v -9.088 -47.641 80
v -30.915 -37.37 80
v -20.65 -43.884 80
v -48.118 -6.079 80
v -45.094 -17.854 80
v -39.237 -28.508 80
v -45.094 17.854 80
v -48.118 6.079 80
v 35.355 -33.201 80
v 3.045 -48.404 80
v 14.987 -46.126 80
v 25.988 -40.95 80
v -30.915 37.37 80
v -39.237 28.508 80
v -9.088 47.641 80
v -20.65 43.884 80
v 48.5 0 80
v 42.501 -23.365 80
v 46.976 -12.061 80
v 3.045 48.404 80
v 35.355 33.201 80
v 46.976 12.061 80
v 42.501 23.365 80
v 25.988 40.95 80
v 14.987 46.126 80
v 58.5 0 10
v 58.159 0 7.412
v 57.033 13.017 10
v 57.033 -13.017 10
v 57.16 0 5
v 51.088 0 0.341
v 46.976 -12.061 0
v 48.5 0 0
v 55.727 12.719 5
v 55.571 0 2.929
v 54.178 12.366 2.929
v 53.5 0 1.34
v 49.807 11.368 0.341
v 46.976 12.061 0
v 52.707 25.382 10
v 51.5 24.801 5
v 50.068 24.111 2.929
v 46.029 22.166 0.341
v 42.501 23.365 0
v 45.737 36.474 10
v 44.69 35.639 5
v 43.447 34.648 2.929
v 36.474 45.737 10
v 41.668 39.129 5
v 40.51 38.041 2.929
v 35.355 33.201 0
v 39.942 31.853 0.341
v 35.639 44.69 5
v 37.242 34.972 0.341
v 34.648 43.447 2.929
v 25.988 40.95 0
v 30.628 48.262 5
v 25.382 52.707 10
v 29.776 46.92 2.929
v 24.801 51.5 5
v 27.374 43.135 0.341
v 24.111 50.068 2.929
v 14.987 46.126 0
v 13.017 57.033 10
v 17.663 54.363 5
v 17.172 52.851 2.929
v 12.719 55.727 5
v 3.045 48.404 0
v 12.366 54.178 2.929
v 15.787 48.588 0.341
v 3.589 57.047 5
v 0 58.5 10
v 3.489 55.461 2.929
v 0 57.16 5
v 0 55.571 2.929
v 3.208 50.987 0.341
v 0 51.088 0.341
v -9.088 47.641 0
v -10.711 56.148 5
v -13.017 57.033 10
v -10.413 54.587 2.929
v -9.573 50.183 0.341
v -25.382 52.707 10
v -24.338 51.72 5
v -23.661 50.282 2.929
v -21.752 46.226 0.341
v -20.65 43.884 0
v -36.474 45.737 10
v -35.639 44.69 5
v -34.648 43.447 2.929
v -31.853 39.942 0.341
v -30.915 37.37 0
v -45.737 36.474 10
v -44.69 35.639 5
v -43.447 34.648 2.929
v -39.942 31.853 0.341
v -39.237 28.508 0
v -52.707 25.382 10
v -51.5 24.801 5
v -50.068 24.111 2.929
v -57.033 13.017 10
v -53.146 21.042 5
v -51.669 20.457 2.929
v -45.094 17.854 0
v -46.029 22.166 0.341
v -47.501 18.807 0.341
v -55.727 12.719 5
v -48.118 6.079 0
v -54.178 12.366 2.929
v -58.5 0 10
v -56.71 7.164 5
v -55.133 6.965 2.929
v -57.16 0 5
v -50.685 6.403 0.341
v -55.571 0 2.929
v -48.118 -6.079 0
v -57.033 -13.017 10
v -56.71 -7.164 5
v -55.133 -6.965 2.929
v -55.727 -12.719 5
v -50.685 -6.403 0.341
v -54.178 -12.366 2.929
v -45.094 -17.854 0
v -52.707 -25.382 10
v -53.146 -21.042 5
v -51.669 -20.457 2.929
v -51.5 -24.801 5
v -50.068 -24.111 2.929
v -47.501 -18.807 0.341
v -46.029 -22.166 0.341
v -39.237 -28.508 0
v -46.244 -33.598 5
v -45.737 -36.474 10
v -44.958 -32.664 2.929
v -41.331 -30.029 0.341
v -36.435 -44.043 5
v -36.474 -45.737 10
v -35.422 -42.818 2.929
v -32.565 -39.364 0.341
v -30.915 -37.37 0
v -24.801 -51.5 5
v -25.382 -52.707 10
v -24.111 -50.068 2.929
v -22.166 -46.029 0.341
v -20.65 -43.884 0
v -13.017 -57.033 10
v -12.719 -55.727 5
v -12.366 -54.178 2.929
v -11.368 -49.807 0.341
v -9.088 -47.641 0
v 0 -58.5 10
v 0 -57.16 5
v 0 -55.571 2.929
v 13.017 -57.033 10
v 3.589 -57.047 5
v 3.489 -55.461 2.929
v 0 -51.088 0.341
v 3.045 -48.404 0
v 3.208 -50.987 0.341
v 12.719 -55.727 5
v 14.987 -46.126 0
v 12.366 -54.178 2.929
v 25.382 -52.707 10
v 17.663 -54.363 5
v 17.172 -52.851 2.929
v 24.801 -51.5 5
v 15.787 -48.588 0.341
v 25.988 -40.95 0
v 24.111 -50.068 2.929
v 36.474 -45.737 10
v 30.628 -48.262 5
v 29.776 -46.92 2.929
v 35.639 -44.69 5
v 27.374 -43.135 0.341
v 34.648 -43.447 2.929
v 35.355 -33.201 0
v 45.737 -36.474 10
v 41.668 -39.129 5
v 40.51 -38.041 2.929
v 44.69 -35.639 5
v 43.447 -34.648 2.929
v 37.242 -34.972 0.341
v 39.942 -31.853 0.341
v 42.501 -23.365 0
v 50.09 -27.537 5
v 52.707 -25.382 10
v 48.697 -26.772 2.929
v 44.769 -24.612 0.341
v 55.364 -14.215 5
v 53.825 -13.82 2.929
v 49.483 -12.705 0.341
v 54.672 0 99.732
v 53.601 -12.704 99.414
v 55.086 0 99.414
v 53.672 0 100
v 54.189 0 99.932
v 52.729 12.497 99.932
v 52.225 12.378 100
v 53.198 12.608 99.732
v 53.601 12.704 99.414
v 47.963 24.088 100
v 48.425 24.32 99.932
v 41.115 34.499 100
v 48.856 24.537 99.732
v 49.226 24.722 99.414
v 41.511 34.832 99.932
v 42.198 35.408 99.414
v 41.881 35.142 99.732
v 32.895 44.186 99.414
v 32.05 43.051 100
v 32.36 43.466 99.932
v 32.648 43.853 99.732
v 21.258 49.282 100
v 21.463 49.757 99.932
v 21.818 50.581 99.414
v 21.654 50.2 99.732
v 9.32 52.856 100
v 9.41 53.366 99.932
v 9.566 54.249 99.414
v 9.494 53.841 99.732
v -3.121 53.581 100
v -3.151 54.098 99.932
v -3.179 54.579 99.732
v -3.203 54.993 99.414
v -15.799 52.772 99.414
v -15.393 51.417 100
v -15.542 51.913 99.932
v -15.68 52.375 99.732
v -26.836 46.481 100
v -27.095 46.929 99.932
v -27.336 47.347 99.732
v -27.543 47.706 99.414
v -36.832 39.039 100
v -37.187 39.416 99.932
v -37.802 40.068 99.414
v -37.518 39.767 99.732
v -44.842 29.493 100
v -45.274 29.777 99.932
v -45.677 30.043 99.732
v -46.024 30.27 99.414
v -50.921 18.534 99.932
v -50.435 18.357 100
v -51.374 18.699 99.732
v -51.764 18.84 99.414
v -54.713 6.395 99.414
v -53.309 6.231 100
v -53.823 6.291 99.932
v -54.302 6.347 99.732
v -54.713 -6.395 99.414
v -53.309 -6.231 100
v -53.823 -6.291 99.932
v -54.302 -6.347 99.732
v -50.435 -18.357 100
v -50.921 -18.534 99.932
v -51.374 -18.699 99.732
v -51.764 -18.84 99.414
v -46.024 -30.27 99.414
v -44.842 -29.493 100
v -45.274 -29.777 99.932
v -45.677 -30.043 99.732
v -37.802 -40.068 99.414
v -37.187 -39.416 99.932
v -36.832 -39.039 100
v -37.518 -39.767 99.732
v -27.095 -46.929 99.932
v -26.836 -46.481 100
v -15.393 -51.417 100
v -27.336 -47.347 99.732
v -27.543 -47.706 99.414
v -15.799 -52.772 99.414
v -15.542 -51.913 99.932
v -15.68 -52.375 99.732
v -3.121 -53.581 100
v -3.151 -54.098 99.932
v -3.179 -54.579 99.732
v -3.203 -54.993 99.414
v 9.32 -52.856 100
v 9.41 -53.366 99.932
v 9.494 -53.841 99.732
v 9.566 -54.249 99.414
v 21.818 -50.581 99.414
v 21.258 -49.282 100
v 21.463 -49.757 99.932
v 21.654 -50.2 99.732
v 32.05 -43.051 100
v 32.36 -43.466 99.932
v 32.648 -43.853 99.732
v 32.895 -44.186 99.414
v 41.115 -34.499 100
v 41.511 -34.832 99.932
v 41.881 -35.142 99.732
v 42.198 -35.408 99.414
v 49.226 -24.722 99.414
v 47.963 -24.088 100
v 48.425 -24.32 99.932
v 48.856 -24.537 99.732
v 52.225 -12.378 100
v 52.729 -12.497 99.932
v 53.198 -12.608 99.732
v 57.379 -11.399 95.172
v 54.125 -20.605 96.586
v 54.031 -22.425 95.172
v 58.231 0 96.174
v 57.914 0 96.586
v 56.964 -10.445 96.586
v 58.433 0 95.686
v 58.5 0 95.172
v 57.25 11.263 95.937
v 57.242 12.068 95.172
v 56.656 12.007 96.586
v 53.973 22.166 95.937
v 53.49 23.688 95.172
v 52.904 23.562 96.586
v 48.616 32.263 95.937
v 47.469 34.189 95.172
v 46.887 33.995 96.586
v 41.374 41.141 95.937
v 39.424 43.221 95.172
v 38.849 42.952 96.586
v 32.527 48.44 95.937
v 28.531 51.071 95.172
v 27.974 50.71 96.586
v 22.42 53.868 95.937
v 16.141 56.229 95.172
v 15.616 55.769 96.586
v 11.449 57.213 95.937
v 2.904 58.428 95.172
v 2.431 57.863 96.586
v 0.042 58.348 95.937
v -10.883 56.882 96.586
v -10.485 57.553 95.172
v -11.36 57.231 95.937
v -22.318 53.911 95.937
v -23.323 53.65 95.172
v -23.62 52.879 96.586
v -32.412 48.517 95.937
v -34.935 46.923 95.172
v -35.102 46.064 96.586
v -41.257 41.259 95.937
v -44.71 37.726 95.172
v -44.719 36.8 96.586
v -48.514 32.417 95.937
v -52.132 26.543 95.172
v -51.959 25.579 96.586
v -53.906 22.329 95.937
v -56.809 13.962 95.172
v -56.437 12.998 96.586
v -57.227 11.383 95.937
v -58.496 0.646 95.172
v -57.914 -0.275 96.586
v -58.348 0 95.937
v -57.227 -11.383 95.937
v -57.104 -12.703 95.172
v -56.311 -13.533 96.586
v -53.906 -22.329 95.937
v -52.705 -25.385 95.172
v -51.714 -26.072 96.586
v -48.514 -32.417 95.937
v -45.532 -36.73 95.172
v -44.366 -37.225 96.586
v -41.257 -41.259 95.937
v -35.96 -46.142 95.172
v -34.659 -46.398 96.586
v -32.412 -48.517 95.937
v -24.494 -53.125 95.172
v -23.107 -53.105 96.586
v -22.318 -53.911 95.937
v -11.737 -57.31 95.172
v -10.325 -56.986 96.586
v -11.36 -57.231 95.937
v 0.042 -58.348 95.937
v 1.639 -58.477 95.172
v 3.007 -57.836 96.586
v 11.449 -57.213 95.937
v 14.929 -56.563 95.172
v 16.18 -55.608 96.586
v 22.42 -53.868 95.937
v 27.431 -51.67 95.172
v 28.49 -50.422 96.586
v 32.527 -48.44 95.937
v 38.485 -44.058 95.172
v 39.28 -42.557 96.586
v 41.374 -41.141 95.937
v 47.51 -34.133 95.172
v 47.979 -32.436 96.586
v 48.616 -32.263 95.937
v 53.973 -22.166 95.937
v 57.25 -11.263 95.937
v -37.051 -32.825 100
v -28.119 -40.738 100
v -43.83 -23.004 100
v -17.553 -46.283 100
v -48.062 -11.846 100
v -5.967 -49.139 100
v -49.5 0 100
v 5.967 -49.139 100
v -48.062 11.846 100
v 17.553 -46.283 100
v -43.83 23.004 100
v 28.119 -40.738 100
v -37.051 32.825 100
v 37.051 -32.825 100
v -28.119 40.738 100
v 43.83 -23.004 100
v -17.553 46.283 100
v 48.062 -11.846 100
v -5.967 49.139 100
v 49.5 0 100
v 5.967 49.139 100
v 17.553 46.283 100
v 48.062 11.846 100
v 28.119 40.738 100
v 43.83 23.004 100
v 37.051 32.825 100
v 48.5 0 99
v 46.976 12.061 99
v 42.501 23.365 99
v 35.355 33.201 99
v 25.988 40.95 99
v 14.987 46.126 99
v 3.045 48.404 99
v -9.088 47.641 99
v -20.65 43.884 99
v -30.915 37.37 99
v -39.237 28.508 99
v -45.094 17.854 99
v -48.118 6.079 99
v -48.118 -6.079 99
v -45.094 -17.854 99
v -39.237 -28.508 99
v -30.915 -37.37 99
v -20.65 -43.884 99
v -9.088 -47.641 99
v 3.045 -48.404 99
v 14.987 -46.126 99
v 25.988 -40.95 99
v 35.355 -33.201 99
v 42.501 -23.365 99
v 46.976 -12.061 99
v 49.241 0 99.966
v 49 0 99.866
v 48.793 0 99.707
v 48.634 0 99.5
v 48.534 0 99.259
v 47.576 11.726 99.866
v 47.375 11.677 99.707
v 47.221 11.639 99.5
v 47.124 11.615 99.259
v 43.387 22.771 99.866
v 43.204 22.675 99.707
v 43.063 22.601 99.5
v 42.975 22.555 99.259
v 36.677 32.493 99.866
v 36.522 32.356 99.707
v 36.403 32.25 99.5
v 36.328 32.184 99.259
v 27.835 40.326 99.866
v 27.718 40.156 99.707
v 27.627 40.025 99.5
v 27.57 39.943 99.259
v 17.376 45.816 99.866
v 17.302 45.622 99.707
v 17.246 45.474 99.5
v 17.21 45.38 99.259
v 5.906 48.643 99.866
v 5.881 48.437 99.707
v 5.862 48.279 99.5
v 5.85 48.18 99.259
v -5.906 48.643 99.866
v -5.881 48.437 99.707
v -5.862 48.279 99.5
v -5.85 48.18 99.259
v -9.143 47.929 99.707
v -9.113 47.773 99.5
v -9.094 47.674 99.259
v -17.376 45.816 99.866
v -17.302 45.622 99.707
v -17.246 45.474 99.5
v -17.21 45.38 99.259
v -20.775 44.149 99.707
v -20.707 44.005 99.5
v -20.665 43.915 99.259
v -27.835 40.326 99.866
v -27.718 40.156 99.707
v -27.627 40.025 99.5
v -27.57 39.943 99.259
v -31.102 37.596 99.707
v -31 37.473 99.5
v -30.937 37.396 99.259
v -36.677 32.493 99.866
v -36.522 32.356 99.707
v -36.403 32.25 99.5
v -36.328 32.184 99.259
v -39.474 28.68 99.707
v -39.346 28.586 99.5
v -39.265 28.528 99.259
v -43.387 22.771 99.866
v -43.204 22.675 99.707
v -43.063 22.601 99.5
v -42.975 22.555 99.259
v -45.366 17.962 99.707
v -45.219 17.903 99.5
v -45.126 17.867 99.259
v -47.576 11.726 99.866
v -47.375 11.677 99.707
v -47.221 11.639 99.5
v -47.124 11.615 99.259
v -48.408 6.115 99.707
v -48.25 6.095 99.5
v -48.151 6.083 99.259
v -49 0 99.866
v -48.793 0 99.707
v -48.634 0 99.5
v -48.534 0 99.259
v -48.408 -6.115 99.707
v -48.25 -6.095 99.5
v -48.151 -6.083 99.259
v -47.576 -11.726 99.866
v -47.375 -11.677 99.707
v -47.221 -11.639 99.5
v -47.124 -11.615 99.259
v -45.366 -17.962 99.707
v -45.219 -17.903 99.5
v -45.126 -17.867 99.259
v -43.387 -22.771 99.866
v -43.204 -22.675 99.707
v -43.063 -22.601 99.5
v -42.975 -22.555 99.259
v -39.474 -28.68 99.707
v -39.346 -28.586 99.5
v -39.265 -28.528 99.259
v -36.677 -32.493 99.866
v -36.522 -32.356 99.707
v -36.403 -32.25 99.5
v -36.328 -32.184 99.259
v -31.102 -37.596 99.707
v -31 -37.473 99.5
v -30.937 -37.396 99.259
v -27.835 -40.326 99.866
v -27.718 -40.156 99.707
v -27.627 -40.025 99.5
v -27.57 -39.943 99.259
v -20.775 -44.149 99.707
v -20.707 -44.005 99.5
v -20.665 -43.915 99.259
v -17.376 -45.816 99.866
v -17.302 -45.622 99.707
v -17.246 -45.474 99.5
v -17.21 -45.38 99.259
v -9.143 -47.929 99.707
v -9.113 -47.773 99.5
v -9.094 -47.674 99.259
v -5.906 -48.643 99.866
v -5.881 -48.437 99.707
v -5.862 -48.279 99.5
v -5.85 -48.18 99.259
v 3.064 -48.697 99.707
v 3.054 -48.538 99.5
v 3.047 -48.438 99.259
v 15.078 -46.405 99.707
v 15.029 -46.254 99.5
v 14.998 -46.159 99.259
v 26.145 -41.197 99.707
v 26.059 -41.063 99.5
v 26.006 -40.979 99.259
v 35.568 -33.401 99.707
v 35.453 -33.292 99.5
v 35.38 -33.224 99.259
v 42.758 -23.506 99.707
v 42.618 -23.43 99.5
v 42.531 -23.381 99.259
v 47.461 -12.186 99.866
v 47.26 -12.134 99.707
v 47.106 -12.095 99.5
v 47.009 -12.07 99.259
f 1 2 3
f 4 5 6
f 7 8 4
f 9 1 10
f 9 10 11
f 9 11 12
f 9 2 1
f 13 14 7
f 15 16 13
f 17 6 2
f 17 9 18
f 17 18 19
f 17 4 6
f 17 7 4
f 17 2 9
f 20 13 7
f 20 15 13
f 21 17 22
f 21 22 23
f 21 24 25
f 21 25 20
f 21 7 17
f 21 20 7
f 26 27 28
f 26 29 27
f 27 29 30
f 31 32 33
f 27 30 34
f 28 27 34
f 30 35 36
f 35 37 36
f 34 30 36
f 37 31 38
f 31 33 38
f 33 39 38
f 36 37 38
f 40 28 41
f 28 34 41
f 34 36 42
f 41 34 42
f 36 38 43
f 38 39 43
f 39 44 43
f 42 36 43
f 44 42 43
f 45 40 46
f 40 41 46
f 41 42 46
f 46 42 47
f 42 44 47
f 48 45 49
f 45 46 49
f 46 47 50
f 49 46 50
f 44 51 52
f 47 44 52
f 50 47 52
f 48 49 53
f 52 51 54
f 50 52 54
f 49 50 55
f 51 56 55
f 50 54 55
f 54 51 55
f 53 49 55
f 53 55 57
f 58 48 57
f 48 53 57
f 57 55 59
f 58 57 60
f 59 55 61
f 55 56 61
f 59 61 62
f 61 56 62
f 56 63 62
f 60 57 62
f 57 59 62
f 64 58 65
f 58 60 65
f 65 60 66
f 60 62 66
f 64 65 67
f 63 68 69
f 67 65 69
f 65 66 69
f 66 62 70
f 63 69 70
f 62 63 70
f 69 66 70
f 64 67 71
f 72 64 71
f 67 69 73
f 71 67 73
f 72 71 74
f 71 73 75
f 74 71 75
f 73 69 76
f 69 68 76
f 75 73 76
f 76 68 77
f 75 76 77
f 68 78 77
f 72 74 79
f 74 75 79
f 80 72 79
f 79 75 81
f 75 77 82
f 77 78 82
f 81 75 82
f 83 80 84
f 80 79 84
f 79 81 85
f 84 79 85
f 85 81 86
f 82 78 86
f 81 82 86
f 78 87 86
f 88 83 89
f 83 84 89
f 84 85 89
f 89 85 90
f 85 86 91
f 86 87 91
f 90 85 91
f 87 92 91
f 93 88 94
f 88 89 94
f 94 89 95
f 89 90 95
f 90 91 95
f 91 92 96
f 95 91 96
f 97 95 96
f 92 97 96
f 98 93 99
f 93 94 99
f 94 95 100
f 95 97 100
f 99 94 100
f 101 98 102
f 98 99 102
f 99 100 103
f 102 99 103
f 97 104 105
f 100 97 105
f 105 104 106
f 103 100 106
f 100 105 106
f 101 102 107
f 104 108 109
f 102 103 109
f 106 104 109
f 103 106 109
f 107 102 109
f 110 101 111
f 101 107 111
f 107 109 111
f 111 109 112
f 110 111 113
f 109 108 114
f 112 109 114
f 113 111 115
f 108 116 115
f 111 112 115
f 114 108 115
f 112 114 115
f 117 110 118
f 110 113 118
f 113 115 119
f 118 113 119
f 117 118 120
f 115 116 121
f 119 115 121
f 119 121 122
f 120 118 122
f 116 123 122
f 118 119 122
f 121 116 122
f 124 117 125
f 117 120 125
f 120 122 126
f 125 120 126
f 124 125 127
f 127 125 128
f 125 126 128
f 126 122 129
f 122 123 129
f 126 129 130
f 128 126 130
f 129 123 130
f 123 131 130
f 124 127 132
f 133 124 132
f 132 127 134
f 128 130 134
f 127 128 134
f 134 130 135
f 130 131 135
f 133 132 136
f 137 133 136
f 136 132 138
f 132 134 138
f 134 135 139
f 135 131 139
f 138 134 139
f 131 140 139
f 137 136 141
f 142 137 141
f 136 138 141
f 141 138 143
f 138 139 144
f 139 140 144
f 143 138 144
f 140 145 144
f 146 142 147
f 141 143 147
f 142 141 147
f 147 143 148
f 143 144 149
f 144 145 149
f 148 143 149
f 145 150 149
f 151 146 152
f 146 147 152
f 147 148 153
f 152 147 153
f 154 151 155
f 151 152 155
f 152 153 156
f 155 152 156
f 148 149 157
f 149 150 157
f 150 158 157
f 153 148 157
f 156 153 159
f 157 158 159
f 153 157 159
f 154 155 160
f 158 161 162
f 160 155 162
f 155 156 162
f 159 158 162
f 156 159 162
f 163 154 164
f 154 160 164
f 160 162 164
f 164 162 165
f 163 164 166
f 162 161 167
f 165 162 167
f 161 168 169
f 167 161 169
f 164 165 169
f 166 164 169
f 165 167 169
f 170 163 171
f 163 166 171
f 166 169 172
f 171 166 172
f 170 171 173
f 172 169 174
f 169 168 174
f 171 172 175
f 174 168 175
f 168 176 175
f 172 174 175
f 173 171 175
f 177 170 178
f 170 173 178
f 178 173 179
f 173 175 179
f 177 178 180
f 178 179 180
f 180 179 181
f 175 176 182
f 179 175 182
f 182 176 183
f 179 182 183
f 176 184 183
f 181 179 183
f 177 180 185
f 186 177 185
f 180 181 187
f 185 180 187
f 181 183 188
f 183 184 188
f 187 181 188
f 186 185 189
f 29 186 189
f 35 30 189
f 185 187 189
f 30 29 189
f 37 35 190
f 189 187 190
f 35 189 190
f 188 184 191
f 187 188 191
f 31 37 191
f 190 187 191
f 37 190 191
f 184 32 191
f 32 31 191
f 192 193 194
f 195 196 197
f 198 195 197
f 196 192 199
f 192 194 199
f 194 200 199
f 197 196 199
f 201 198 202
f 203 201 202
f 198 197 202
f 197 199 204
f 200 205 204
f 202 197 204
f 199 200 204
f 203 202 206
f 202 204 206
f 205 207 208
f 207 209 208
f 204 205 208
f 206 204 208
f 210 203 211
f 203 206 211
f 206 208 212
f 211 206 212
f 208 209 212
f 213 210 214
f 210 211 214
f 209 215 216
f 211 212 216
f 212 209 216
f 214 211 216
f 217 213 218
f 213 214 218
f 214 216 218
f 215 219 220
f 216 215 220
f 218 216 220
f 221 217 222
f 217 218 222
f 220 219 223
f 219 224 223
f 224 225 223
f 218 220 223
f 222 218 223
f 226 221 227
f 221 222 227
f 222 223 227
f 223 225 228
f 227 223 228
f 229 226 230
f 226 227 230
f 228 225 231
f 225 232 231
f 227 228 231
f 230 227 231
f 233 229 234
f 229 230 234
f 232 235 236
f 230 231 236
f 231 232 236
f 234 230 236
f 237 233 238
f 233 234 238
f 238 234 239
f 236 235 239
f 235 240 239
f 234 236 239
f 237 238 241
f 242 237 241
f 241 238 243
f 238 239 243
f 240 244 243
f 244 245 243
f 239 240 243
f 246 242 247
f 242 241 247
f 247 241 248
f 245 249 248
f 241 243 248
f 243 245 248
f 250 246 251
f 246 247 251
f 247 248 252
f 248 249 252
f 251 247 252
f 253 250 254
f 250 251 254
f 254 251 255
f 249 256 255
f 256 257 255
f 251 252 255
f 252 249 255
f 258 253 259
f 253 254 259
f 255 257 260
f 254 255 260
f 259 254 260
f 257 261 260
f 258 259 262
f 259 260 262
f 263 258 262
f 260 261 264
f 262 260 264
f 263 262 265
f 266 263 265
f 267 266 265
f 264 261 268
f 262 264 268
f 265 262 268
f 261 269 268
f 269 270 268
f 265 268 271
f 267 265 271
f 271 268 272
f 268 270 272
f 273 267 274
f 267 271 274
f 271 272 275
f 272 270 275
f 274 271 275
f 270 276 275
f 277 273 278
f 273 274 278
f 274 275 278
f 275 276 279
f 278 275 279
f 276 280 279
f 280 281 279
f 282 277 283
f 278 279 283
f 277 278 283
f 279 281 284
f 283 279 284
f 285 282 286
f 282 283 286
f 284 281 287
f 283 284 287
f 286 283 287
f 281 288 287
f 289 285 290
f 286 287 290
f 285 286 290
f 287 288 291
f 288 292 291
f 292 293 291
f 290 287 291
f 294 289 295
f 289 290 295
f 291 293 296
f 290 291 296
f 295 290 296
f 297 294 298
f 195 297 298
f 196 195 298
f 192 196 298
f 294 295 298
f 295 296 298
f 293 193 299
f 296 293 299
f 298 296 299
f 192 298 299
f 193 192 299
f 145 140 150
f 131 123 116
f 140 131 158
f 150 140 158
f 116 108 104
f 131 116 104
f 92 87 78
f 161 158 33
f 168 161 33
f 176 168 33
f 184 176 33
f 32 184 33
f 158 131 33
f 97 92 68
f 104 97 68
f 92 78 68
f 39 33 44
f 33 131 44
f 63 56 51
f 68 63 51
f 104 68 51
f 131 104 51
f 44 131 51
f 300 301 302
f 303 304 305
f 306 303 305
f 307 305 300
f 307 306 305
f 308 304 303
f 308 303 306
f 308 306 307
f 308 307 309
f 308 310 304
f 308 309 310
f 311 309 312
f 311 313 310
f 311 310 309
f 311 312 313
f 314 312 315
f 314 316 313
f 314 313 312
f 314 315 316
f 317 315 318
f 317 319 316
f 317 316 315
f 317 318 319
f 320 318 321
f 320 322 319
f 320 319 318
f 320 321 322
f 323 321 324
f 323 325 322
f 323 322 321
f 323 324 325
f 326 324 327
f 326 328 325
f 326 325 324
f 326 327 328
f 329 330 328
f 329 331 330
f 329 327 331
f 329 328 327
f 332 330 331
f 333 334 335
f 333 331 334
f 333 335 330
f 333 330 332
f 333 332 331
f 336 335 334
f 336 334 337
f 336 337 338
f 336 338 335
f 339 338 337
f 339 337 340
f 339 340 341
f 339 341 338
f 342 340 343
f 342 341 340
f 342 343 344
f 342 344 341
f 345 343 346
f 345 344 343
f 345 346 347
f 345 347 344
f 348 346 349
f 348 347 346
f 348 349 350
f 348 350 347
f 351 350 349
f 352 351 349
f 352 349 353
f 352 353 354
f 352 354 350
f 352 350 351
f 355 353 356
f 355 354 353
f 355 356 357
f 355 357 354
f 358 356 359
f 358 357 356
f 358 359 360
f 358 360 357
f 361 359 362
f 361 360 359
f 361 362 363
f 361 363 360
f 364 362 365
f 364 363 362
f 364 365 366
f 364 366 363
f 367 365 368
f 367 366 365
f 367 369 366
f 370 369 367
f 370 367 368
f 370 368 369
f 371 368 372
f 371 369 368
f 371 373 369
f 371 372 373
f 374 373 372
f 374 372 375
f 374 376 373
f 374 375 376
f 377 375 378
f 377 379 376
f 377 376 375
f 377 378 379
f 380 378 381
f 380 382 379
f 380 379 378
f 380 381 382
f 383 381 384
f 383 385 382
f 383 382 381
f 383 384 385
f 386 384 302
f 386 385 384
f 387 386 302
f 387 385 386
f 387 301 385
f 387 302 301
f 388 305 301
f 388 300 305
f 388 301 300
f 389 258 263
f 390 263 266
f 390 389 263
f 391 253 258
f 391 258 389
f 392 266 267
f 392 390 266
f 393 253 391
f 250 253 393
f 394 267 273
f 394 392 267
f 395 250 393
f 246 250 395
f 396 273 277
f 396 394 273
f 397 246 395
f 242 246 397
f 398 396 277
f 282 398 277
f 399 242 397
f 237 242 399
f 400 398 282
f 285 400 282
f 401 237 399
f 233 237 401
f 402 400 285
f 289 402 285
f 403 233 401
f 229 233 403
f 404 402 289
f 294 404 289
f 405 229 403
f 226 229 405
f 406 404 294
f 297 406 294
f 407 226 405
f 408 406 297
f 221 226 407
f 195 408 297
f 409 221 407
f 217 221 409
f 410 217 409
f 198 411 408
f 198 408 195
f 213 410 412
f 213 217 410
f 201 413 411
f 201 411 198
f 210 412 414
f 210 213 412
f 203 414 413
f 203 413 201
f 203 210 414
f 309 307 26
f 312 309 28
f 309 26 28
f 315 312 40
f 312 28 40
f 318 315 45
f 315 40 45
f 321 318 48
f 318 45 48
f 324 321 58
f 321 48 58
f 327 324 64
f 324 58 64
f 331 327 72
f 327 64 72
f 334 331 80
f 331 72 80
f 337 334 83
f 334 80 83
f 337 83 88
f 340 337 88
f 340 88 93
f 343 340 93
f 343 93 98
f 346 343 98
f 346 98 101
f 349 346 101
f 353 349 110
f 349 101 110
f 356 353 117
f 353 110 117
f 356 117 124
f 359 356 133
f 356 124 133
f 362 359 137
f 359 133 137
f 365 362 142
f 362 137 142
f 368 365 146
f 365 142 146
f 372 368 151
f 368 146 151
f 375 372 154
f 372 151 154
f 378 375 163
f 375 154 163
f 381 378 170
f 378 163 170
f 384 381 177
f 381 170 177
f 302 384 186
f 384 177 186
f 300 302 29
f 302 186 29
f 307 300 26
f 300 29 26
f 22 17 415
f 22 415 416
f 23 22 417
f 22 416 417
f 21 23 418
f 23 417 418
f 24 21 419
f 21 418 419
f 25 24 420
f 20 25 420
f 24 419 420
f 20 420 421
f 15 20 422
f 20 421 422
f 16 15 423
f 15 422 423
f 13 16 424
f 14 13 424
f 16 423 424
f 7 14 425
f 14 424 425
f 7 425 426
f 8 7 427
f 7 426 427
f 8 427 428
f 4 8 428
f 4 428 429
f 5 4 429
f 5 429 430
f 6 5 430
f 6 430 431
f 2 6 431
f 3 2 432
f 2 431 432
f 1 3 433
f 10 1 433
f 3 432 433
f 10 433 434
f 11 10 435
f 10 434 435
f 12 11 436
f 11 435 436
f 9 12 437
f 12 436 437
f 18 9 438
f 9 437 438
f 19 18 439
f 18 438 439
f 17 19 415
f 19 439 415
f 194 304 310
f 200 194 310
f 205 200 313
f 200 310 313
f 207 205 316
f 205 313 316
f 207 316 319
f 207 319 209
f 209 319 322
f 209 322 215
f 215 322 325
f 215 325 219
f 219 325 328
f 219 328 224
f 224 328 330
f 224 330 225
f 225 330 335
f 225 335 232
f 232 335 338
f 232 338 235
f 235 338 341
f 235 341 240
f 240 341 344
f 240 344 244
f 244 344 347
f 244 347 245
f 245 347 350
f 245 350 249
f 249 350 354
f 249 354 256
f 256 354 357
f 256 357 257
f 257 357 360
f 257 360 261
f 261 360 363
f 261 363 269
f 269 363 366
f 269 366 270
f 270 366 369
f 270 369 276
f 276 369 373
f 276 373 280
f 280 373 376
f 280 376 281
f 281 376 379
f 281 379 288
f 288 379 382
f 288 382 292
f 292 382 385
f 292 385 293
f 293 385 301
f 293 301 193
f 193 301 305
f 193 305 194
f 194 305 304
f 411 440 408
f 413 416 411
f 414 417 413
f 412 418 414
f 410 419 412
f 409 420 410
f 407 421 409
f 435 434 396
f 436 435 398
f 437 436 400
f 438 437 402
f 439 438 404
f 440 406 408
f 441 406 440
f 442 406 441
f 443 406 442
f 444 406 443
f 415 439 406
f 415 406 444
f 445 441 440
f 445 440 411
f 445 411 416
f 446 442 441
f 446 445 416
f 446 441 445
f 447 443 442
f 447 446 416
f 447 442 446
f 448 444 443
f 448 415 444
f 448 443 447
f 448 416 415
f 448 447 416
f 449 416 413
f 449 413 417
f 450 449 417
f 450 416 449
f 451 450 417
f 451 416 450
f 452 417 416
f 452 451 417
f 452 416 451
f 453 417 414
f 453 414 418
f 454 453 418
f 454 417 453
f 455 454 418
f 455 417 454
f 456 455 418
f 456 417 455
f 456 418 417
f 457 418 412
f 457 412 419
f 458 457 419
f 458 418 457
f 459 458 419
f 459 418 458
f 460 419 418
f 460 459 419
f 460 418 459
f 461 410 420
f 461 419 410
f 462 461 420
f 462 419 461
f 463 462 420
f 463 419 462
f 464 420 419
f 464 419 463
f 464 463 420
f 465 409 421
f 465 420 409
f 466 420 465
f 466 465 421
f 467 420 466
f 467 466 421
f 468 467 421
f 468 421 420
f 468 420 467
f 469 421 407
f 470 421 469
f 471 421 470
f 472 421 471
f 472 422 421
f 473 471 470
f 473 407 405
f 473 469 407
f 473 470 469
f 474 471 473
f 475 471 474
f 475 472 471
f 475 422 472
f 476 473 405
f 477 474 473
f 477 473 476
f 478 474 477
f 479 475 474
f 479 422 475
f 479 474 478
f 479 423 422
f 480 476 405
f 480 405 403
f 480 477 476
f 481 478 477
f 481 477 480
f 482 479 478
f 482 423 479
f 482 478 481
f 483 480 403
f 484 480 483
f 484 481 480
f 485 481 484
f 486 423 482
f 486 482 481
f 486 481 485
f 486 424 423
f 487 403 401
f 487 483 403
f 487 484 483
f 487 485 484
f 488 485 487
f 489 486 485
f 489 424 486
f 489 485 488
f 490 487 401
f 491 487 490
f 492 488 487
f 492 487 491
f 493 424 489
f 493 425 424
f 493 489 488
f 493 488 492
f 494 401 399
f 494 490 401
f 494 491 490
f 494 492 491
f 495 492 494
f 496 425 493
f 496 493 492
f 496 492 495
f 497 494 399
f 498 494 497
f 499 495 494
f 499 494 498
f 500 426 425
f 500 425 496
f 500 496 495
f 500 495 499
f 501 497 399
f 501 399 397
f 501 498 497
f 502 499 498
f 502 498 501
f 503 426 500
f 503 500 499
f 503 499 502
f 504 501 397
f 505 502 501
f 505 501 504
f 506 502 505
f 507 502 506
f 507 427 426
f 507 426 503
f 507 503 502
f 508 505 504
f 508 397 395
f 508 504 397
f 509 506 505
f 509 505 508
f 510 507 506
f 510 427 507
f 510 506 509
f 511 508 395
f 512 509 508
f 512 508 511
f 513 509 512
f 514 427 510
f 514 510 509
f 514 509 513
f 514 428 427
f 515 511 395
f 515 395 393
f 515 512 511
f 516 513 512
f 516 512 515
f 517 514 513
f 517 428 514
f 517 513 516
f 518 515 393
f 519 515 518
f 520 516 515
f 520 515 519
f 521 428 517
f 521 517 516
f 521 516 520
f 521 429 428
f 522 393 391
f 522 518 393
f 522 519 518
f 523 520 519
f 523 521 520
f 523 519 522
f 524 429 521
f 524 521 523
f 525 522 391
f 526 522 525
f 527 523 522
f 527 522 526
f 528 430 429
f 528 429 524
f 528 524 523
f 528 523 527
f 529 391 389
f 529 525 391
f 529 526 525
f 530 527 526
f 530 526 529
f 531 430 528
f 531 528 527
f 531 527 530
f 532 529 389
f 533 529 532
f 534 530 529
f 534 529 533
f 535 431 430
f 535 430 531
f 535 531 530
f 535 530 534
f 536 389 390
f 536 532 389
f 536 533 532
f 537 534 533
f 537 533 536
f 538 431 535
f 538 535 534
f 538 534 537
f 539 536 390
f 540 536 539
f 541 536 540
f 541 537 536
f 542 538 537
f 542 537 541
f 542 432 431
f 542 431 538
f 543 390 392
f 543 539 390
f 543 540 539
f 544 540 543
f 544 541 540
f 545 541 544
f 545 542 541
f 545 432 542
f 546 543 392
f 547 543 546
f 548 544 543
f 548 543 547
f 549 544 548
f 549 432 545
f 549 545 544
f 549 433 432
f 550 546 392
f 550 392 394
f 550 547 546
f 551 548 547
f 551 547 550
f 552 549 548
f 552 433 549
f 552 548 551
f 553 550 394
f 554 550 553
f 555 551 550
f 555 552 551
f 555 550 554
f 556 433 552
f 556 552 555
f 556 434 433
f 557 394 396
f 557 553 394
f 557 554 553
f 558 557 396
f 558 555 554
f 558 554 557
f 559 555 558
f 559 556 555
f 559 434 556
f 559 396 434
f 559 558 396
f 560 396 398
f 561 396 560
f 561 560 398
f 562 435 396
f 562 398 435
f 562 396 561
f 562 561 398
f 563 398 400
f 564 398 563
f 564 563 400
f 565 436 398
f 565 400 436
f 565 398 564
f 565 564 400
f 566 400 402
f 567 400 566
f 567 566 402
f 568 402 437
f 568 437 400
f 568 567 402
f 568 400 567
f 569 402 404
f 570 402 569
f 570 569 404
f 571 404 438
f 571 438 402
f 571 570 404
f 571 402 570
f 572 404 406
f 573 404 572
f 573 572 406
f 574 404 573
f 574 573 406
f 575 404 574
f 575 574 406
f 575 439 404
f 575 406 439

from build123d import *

# Parameters (mm, degrees)
SKETCH1_R           = 58.5
BOSS_EXTRUDE2_DEPTH = 100
SKETCH3_R           = 48.5
CUT_EXTRUDE1_DEPTH  = 20
FILLET1_R           = 1
CHAMFER1_SIZE       = 4
FILLET3_R           = 2
FILLET4_R           = 10


with BuildPart() as part:
    # Sketch1 → Boss-Extrude2 (new body)
    with BuildSketch(Plane.XY):
        Circle(SKETCH1_R)
    extrude(amount=BOSS_EXTRUDE2_DEPTH)

    # Sketch3 → Cut-Extrude1 (cut)
    with BuildSketch(Plane.XY.offset(100)):
        Circle(SKETCH3_R)
    extrude(amount=-CUT_EXTRUDE1_DEPTH, mode=Mode.SUBTRACT)

    # Fillet1
    fillet1_edges = [part.edges().sort_by_distance(p)[0] for p in [
        (-48.5, 0, 100),
    ]]
    fillet(fillet1_edges, radius=FILLET1_R)

    # Chamfer1
    chamfer1_edges = [part.edges().sort_by_distance(p)[0] for p in [
        (-58.5, 0, 100),
    ]]
    chamfer(chamfer1_edges, length=CHAMFER1_SIZE)

    # Fillet3
    fillet3_edges = [part.edges().sort_by_distance(p)[0] for p in [
        (-54.5, 0, 100),
        (-58.5, 0, 96),
    ]]
    fillet(fillet3_edges, radius=FILLET3_R)

    # Fillet4
    fillet4_edges = [part.edges().sort_by_distance(p)[0] for p in [
        (-58.5, 0, 0),
    ]]
    fillet(fillet4_edges, radius=FILLET4_R)


solid = part.part
